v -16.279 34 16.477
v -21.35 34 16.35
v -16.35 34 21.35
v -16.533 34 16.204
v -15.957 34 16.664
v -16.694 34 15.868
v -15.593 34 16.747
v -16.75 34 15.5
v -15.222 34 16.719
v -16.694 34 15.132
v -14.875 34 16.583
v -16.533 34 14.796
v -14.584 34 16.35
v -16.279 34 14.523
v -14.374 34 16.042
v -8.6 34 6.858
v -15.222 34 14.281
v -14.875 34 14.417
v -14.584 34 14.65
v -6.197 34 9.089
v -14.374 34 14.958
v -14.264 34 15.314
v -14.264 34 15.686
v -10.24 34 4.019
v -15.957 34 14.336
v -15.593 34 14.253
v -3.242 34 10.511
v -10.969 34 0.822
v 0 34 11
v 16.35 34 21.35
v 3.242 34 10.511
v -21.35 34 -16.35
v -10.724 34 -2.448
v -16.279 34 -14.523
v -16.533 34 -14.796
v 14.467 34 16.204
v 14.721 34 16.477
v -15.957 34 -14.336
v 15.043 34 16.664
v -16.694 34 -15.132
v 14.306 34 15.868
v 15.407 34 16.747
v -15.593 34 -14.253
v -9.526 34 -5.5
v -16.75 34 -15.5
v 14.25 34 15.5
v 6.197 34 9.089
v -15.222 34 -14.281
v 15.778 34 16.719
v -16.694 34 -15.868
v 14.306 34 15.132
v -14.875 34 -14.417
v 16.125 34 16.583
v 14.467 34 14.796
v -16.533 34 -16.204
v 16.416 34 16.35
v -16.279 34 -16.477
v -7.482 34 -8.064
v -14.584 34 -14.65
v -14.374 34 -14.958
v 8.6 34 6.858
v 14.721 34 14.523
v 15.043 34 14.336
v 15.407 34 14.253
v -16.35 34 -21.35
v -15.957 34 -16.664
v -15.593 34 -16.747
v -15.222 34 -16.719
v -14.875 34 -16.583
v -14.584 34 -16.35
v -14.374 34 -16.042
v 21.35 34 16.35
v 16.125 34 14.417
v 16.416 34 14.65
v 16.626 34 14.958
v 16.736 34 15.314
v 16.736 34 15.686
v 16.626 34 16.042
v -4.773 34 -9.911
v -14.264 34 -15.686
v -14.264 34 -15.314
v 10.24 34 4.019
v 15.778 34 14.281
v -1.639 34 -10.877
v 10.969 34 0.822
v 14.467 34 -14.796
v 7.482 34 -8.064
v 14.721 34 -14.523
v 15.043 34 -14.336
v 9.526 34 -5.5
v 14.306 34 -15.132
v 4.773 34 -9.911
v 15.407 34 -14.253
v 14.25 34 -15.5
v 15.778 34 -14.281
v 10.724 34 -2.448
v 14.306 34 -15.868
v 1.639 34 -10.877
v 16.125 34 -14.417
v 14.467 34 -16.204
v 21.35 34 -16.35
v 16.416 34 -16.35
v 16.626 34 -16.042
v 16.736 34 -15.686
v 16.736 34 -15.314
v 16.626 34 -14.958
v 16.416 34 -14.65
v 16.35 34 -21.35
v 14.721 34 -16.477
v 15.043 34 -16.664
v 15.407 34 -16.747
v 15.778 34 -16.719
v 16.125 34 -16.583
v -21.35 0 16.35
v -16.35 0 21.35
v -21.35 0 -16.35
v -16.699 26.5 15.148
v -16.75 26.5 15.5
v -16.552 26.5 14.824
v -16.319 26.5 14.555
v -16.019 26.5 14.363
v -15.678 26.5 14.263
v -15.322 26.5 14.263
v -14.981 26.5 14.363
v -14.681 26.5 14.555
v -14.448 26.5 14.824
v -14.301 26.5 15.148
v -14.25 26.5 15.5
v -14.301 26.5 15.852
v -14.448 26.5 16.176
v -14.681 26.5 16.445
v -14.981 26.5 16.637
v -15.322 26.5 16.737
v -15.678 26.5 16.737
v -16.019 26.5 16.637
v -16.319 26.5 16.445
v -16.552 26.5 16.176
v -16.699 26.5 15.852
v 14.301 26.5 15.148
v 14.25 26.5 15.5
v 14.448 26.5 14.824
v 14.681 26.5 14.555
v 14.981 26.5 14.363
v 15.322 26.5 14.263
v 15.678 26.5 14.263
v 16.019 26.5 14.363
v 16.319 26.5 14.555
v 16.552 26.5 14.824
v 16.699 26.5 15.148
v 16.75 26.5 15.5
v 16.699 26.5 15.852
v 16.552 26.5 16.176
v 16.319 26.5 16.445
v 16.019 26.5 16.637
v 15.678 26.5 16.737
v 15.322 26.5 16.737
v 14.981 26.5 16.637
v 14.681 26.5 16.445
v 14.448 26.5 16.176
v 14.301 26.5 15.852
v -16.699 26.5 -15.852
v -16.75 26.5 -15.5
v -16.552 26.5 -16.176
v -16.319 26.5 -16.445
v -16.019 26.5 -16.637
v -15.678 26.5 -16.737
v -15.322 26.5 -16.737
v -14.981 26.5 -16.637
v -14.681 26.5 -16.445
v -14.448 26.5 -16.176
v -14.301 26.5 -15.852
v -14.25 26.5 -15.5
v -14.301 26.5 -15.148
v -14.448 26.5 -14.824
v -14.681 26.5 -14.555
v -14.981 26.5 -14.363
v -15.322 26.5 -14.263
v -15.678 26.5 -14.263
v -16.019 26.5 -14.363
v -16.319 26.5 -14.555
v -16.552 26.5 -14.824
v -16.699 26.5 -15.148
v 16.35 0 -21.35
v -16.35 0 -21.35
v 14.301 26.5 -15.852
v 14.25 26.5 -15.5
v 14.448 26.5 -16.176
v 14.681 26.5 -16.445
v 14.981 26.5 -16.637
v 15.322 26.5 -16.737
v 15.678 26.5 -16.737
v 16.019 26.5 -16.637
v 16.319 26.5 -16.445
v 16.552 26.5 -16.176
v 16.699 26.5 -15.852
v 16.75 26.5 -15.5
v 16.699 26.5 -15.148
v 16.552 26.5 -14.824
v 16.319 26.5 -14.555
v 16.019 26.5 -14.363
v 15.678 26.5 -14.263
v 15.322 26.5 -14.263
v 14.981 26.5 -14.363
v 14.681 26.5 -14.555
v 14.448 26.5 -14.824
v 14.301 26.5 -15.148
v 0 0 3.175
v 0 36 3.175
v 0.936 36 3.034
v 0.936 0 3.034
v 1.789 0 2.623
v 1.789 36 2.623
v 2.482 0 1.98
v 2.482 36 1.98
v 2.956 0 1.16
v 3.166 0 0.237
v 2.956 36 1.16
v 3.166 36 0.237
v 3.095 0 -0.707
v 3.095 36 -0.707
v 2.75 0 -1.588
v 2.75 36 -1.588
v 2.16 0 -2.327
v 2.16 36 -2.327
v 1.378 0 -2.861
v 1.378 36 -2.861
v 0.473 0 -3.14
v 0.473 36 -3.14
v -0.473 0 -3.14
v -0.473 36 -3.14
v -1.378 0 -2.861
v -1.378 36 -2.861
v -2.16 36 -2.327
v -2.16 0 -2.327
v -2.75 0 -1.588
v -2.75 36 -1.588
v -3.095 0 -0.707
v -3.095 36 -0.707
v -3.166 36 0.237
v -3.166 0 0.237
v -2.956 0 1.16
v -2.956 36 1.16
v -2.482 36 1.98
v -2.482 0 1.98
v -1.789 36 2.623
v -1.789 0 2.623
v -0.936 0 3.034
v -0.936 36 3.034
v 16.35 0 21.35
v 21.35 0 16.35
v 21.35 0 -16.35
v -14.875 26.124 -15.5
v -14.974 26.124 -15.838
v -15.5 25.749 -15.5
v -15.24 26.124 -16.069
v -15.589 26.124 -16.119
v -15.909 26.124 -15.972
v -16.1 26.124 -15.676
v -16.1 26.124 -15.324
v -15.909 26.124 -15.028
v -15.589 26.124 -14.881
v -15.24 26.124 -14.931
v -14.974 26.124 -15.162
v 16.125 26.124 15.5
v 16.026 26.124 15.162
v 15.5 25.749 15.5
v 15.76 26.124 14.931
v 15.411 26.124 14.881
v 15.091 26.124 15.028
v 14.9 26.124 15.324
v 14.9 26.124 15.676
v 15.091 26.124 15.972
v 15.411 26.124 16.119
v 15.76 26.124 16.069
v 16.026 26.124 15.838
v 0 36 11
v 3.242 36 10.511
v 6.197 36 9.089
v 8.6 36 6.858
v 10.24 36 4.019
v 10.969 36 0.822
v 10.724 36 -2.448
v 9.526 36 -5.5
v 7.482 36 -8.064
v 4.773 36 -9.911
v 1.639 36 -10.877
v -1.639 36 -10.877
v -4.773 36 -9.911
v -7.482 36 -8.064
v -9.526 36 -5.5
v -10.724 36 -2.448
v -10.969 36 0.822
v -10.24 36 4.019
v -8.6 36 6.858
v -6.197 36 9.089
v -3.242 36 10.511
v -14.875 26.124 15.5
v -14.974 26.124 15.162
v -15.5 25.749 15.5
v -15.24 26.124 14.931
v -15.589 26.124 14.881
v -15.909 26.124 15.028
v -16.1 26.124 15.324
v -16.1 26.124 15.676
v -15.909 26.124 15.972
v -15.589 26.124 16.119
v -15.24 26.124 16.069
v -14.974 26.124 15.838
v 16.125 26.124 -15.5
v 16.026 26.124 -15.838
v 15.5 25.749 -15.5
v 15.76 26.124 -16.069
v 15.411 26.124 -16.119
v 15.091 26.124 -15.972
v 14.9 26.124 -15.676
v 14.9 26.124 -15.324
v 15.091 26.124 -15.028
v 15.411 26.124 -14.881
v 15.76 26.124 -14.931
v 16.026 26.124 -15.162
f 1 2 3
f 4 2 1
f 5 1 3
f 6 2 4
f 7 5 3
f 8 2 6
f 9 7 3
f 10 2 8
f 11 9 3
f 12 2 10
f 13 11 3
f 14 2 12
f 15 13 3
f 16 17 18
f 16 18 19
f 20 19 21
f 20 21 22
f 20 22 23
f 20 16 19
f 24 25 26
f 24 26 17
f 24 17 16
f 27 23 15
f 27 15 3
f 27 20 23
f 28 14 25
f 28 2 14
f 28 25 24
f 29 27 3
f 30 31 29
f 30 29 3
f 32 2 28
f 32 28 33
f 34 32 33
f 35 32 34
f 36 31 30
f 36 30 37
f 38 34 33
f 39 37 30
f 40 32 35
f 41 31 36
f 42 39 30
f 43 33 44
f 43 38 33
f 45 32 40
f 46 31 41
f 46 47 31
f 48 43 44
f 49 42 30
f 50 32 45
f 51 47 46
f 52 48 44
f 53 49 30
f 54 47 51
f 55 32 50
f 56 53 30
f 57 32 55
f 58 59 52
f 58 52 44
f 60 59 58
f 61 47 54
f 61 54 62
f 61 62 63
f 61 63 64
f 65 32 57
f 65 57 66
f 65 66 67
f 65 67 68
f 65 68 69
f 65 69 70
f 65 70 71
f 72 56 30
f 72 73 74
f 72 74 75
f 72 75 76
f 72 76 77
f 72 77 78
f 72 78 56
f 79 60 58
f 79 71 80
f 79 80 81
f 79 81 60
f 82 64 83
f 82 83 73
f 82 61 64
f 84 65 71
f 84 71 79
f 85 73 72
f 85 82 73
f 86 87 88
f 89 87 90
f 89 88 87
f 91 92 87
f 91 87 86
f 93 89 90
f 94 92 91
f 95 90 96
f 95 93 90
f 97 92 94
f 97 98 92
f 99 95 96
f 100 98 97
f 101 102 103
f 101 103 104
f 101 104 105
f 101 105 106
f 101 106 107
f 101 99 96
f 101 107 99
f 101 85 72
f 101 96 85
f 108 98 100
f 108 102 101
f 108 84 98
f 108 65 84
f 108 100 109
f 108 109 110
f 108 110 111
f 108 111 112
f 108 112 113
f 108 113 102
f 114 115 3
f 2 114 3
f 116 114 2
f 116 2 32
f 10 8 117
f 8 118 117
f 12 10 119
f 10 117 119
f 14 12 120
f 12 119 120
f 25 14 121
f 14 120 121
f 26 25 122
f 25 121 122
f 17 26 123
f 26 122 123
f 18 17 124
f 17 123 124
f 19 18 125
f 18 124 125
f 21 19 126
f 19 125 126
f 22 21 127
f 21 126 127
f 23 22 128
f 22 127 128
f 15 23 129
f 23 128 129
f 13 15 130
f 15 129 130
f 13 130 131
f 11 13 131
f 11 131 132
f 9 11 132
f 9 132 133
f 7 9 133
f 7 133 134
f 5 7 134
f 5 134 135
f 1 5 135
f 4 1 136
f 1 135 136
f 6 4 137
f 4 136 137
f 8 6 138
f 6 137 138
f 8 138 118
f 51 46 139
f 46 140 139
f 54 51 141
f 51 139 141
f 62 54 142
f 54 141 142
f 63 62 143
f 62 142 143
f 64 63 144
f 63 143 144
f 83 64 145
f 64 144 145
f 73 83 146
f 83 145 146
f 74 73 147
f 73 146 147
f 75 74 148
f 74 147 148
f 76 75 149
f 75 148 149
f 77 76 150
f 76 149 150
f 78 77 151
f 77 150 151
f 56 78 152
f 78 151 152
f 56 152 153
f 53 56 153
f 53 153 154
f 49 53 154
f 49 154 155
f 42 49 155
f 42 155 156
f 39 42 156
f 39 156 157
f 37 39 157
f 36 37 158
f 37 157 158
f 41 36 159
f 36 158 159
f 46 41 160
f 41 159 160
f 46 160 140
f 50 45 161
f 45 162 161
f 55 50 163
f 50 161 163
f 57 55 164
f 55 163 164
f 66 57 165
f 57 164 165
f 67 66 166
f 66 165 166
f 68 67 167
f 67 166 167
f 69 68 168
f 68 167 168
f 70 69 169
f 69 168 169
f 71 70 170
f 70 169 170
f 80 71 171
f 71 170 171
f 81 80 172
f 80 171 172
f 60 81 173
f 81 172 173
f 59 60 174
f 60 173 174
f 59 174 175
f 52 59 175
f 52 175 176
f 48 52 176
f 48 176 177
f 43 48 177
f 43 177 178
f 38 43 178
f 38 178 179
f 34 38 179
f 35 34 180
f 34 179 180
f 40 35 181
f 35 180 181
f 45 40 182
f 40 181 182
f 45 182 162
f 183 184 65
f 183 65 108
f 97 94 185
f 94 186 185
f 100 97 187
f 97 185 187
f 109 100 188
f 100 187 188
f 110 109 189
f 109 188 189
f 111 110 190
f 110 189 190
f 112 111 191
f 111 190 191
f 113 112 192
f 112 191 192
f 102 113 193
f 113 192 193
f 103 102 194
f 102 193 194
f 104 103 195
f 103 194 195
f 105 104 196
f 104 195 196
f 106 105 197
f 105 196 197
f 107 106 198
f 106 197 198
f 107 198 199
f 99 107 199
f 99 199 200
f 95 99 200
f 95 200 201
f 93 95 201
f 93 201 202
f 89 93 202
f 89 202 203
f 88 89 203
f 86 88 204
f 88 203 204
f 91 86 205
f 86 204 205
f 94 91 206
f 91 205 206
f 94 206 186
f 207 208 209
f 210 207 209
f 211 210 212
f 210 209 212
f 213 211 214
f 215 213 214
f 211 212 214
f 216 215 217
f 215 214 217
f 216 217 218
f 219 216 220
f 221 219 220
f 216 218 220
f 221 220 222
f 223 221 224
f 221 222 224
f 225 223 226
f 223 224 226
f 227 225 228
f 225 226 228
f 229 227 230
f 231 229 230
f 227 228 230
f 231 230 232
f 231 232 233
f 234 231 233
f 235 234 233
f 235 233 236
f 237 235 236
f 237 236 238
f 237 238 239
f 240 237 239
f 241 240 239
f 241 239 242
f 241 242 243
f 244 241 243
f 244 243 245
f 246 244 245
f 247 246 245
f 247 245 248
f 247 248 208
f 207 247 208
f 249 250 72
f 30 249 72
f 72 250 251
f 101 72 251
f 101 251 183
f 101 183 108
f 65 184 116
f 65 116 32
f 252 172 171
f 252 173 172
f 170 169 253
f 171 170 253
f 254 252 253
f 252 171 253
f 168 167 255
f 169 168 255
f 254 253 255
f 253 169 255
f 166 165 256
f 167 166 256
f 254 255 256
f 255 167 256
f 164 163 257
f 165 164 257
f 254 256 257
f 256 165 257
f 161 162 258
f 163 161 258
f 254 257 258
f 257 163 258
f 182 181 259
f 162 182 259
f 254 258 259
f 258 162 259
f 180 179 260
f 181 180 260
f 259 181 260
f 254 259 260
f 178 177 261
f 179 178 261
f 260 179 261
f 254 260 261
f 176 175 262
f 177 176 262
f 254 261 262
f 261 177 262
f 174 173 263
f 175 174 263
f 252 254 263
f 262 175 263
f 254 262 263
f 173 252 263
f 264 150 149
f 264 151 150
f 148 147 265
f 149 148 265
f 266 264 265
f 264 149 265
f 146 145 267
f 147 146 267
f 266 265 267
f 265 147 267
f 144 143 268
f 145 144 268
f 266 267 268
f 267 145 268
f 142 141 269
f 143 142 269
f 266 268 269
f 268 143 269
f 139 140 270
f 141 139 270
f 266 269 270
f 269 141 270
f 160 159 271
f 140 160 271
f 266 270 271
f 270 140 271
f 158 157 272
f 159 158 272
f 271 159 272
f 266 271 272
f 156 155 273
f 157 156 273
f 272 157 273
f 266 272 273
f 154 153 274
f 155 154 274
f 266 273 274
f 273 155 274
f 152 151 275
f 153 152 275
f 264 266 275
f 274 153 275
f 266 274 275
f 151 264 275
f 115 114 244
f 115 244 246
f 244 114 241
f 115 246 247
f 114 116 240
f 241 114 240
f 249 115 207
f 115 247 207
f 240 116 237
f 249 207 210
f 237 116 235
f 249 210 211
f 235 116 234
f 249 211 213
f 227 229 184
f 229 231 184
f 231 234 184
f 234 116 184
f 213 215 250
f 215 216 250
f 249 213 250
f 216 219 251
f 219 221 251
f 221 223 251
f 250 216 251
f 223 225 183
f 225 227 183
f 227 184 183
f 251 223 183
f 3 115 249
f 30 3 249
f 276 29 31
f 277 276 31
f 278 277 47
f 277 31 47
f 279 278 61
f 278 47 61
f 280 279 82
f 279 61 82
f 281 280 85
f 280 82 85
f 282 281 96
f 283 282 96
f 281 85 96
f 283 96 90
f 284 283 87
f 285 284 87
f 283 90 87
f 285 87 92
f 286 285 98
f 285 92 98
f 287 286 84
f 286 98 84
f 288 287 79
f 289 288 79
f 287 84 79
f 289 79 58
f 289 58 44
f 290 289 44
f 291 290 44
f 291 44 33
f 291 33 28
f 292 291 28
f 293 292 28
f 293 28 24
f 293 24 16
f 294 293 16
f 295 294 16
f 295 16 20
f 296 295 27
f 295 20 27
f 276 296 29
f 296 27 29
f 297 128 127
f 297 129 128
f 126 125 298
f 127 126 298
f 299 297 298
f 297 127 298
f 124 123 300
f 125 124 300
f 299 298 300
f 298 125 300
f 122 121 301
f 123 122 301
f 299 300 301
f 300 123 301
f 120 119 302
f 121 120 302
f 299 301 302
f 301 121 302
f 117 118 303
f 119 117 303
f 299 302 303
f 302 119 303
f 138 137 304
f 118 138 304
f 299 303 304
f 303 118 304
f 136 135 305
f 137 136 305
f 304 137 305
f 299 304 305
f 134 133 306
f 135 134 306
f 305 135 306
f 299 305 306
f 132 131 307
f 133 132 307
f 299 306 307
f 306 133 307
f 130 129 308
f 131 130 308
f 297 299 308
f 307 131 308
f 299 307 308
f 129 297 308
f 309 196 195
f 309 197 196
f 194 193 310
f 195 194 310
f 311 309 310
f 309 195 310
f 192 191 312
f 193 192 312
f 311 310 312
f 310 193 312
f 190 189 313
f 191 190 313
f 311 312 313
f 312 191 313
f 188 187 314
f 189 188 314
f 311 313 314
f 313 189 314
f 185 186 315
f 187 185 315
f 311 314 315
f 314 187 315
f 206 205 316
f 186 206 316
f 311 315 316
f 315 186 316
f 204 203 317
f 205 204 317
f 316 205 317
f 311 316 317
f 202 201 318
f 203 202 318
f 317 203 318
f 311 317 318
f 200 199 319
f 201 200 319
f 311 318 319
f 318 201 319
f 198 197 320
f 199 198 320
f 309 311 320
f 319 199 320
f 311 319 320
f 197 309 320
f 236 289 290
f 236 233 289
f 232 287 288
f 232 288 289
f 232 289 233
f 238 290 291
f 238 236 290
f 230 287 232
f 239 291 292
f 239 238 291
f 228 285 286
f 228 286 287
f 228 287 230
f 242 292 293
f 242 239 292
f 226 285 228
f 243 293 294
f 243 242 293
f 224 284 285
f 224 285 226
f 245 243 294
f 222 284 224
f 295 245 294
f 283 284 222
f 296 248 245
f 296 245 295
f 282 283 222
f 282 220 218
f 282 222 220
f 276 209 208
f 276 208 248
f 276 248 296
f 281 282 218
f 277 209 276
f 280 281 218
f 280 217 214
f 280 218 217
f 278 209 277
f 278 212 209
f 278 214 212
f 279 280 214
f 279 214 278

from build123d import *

# Parameters (mm, degrees)
SKETCH1_W             = 42.7
SKETCH1_H             = 42.7
BOSS_EXTRUDE1_DEPTH   = 34
SKETCH2_R             = 11
BOSS_EXTRUDE2_DEPTH   = 2
SKETCH3_R             = 3.175
CUT_EXTRUDE1_DEPTH    = 47.985582895
M3_TAPPED_HOLE1_D     = 2.5
M3_TAPPED_HOLE1_DEPTH = 7.5
M3_TAPPED_HOLE1_TIP   = 0.751075774
CHAMFER1_SIZE         = 5


with BuildPart() as part:
    # Sketch1 → Boss-Extrude1 (new body)
    with BuildSketch(Plane(origin=(0, 0, 0), x_dir=(1, 0, 0), z_dir=(0, 1, 0))):
        Rectangle(SKETCH1_W, SKETCH1_H)
    extrude(amount=BOSS_EXTRUDE1_DEPTH)

    # Sketch2 → Boss-Extrude2 (add)
    with BuildSketch(Plane(origin=(0, 34, 0), x_dir=(1, 0, 0), z_dir=(0, 1, 0))):
        with Locations(Location((0, 0, 0), (0, 0, 270))):
            Circle(SKETCH2_R)
    extrude(amount=BOSS_EXTRUDE2_DEPTH)

    # Sketch3 → Cut-Extrude1 (cut, through all)
    with BuildSketch(Plane(origin=(0, 36, 0), x_dir=(1, 0, 0), z_dir=(0, 1, 0))):
        with Locations(Location((0, 0, 0), (0, 0, 270))):
            Circle(SKETCH3_R)
    extrude(amount=-CUT_EXTRUDE1_DEPTH, mode=Mode.SUBTRACT)

    # M3 Tapped Hole1
    with Locations(Plane(origin=(0, 34, 0), x_dir=(1, 0, 0), z_dir=(0, 1, 0))):
        with Locations((15.5, 15.5), (-15.5, -15.5), (-15.5, 15.5), (15.5, -15.5)):
            Hole(M3_TAPPED_HOLE1_D / 2, depth=M3_TAPPED_HOLE1_DEPTH)
            with Locations((0, 0, -(M3_TAPPED_HOLE1_DEPTH + M3_TAPPED_HOLE1_TIP / 2))):  # 118° drill point
                Cone(0, M3_TAPPED_HOLE1_D / 2, M3_TAPPED_HOLE1_TIP, mode=Mode.SUBTRACT)

    # Chamfer1
    chamfer1_edges = [part.edges().sort_by_distance(p)[0] for p in [
        (21.35, 17, 21.35),
        (-21.35, 17, 21.35),
        (-21.35, 17, -21.35),
        (21.35, 17, -21.35),
    ]]
    chamfer(chamfer1_edges, length=CHAMFER1_SIZE)


solid = part.part
